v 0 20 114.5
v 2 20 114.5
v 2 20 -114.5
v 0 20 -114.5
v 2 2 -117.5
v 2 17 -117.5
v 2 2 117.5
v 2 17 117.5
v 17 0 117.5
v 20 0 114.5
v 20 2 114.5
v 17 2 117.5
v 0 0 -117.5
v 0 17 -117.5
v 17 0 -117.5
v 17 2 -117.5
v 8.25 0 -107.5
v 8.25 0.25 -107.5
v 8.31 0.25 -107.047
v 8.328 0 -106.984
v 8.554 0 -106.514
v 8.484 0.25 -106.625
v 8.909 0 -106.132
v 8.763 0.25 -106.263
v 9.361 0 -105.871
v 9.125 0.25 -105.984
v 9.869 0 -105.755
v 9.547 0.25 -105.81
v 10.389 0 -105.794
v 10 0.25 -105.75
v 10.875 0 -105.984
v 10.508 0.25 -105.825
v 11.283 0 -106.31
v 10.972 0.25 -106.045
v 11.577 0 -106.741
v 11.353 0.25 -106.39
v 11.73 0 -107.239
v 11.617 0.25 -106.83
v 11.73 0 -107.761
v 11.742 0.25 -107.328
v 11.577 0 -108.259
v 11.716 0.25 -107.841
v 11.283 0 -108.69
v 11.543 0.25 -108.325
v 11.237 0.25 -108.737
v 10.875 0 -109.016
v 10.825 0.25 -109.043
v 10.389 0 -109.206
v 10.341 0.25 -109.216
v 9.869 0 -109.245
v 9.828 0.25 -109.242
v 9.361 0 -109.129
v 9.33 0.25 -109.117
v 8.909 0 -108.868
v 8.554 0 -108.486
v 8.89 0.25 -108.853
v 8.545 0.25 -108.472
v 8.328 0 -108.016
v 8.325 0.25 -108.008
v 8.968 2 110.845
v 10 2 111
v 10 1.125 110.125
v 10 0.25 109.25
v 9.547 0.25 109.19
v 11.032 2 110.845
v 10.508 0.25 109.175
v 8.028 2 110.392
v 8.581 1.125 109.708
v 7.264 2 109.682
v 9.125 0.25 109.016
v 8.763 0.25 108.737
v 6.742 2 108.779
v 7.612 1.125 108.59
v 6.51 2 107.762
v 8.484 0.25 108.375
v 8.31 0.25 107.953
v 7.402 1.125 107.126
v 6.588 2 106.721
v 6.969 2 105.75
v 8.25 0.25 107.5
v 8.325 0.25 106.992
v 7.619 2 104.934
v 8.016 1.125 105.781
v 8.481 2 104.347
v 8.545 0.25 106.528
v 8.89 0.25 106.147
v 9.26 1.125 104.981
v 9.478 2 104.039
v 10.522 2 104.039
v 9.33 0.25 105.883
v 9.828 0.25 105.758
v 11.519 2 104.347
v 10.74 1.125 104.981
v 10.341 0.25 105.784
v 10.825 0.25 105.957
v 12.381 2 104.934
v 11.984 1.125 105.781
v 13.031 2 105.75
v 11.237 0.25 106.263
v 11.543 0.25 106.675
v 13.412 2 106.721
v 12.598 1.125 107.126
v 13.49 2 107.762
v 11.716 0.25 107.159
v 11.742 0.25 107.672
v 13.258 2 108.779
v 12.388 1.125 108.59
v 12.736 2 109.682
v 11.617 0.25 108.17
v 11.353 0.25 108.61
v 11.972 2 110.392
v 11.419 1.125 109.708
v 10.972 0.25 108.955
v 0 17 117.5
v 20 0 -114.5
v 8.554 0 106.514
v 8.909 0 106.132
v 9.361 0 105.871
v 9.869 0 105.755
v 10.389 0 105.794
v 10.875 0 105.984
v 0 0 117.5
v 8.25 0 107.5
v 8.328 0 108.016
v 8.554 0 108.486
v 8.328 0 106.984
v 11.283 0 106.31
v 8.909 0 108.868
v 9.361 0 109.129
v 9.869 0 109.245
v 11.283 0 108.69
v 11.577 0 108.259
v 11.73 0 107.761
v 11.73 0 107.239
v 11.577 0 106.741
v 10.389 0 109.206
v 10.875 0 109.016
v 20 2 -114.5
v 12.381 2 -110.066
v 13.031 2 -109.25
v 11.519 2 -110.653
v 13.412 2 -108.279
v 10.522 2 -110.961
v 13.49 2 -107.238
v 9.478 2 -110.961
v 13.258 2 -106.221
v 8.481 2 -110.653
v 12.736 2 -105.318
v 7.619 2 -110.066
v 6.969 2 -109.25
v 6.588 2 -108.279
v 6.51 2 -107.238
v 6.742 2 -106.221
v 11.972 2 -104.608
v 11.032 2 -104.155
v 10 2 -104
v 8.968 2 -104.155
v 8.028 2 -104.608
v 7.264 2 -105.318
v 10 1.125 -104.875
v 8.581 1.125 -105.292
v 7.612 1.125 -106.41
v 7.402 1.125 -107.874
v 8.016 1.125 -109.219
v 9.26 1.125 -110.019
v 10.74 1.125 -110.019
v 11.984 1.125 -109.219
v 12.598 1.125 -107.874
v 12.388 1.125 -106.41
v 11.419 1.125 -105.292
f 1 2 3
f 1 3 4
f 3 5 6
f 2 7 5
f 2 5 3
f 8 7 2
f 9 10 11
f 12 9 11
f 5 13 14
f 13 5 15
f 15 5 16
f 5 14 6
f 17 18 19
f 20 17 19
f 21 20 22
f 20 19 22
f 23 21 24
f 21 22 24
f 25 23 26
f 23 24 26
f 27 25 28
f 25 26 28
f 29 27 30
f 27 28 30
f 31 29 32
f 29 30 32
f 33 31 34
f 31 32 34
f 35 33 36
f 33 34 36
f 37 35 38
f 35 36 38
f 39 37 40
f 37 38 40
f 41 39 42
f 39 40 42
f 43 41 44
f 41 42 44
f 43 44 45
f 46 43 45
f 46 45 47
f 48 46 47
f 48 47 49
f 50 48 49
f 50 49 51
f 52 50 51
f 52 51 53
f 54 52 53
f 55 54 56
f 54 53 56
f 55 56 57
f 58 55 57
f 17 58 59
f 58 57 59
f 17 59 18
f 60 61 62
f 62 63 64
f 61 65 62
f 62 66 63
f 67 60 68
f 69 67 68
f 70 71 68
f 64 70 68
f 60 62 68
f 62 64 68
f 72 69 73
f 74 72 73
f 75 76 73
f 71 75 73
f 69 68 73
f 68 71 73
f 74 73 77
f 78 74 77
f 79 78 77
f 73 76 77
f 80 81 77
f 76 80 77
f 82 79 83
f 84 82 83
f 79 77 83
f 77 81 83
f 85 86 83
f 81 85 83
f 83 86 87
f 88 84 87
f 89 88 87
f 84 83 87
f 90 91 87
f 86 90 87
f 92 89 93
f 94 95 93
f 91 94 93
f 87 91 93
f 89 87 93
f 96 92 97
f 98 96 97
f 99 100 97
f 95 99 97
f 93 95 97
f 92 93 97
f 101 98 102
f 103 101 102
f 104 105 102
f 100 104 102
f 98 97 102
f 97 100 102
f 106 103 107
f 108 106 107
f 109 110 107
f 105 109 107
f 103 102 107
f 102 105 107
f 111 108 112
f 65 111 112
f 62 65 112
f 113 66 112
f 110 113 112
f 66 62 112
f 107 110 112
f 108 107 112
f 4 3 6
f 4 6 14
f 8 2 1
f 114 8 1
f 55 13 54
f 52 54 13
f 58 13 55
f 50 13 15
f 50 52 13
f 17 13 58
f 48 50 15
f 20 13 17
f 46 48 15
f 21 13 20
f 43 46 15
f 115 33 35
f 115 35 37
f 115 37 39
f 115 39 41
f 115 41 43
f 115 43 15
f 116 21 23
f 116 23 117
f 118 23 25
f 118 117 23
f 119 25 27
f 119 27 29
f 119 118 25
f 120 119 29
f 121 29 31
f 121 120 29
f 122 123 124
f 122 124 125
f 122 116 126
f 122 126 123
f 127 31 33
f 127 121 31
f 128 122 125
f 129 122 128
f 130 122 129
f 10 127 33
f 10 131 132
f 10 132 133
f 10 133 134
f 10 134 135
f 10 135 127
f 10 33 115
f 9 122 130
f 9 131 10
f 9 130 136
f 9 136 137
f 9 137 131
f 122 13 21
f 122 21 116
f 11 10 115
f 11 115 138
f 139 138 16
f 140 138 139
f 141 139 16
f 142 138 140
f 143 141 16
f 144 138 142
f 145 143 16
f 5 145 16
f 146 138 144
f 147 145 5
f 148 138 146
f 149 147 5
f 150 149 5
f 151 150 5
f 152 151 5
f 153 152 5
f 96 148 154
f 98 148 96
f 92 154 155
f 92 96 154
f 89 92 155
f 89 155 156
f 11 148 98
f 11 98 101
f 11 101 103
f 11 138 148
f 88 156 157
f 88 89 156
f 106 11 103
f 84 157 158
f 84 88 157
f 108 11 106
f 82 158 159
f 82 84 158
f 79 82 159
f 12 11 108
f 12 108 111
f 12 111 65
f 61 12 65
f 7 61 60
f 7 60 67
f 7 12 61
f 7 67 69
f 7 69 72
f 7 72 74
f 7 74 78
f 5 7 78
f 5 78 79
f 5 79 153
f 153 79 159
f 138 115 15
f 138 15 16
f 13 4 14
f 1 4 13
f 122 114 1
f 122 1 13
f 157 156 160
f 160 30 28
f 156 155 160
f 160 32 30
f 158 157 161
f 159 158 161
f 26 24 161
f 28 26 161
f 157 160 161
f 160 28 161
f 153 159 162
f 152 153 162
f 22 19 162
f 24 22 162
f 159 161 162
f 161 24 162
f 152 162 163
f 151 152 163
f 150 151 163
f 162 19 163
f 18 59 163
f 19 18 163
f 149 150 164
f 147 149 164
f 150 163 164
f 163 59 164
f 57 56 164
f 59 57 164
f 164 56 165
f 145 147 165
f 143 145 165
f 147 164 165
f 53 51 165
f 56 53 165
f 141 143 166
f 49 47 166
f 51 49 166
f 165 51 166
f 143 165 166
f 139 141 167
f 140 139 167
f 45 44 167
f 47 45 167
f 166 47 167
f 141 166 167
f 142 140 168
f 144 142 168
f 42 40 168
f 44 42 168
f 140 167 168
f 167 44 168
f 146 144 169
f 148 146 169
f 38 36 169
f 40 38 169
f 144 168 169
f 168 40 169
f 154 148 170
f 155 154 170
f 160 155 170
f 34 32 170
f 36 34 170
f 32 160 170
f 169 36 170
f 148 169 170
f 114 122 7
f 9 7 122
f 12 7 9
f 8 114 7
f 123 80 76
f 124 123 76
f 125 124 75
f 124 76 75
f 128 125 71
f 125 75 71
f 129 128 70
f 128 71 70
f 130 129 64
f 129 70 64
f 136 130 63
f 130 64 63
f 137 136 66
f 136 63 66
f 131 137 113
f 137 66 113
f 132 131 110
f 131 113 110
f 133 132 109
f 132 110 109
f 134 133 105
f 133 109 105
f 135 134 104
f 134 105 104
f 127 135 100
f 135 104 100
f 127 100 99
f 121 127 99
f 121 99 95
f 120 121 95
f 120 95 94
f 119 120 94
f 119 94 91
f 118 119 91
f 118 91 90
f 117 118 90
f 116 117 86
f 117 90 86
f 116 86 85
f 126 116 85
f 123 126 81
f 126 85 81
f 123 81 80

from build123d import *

# Parameters (mm, degrees)
BOSS_EXTRUDE1_DEPTH = 117.5
SKETCH3_R           = 1.75
CUT_EXTRUDE2_DEPTH  = 121.541486634
CHAMFER1_SIZE       = 3


with BuildPart() as part:
    # Sketch1 → Boss-Extrude1 (new, symmetric)
    with BuildSketch(Plane.XY):
        Polygon((0, 0), (20, 0), (20, 2), (2, 2), (2, 20), (0, 20), align=None)
    extrude(amount=BOSS_EXTRUDE1_DEPTH, both=True)

    # Cut-Extrude1 cone 1 section (through the dimple's axis) → Cut-Extrude1 (revolve, cut)
    with BuildSketch(Plane(origin=(10, 2, -107.5), x_dir=(0, 0, 1), z_dir=(1, 0, 0))):
        Polygon((0, 0), (3.5, 0), (0, 3.5), align=None)
    revolve(axis=Axis((10, 2, -107.5), (0, -1, 0)), mode=Mode.SUBTRACT)

    # Cut-Extrude1 cone 2 section (through the dimple's axis) → Cut-Extrude1 cone 2 (revolve, cut)
    with BuildSketch(Plane(origin=(10, 2, 107.5), x_dir=(0, 0, 1), z_dir=(1, 0, 0))):
        Polygon((0, 0), (3.5, 0), (0, 3.5), align=None)
    revolve(axis=Axis((10, 2, 107.5), (0, -1, 0)), mode=Mode.SUBTRACT)

    # Sketch3 → Cut-Extrude2 (cut, through all)
    with BuildSketch(Plane(origin=(0, 2, 0), x_dir=(1, 0, 0), z_dir=(0, 1, 0))):
        with Locations(Location((10, -107.5, 0), (0, 0, 180))):
            Circle(SKETCH3_R)
        with Locations(Location((10, 107.5, 0), (0, 0, 180))):
            Circle(SKETCH3_R)
    extrude(amount=-CUT_EXTRUDE2_DEPTH, mode=Mode.SUBTRACT)

    # Chamfer1
    chamfer1_edges = [part.edges().sort_by_distance(p)[0] for p in [
        (20, 1, 117.5),
        (1, 20, 117.5),
        (1, 20, -117.5),
        (20, 1, -117.5),
    ]]
    chamfer(chamfer1_edges, length=CHAMFER1_SIZE)


solid = part.part
